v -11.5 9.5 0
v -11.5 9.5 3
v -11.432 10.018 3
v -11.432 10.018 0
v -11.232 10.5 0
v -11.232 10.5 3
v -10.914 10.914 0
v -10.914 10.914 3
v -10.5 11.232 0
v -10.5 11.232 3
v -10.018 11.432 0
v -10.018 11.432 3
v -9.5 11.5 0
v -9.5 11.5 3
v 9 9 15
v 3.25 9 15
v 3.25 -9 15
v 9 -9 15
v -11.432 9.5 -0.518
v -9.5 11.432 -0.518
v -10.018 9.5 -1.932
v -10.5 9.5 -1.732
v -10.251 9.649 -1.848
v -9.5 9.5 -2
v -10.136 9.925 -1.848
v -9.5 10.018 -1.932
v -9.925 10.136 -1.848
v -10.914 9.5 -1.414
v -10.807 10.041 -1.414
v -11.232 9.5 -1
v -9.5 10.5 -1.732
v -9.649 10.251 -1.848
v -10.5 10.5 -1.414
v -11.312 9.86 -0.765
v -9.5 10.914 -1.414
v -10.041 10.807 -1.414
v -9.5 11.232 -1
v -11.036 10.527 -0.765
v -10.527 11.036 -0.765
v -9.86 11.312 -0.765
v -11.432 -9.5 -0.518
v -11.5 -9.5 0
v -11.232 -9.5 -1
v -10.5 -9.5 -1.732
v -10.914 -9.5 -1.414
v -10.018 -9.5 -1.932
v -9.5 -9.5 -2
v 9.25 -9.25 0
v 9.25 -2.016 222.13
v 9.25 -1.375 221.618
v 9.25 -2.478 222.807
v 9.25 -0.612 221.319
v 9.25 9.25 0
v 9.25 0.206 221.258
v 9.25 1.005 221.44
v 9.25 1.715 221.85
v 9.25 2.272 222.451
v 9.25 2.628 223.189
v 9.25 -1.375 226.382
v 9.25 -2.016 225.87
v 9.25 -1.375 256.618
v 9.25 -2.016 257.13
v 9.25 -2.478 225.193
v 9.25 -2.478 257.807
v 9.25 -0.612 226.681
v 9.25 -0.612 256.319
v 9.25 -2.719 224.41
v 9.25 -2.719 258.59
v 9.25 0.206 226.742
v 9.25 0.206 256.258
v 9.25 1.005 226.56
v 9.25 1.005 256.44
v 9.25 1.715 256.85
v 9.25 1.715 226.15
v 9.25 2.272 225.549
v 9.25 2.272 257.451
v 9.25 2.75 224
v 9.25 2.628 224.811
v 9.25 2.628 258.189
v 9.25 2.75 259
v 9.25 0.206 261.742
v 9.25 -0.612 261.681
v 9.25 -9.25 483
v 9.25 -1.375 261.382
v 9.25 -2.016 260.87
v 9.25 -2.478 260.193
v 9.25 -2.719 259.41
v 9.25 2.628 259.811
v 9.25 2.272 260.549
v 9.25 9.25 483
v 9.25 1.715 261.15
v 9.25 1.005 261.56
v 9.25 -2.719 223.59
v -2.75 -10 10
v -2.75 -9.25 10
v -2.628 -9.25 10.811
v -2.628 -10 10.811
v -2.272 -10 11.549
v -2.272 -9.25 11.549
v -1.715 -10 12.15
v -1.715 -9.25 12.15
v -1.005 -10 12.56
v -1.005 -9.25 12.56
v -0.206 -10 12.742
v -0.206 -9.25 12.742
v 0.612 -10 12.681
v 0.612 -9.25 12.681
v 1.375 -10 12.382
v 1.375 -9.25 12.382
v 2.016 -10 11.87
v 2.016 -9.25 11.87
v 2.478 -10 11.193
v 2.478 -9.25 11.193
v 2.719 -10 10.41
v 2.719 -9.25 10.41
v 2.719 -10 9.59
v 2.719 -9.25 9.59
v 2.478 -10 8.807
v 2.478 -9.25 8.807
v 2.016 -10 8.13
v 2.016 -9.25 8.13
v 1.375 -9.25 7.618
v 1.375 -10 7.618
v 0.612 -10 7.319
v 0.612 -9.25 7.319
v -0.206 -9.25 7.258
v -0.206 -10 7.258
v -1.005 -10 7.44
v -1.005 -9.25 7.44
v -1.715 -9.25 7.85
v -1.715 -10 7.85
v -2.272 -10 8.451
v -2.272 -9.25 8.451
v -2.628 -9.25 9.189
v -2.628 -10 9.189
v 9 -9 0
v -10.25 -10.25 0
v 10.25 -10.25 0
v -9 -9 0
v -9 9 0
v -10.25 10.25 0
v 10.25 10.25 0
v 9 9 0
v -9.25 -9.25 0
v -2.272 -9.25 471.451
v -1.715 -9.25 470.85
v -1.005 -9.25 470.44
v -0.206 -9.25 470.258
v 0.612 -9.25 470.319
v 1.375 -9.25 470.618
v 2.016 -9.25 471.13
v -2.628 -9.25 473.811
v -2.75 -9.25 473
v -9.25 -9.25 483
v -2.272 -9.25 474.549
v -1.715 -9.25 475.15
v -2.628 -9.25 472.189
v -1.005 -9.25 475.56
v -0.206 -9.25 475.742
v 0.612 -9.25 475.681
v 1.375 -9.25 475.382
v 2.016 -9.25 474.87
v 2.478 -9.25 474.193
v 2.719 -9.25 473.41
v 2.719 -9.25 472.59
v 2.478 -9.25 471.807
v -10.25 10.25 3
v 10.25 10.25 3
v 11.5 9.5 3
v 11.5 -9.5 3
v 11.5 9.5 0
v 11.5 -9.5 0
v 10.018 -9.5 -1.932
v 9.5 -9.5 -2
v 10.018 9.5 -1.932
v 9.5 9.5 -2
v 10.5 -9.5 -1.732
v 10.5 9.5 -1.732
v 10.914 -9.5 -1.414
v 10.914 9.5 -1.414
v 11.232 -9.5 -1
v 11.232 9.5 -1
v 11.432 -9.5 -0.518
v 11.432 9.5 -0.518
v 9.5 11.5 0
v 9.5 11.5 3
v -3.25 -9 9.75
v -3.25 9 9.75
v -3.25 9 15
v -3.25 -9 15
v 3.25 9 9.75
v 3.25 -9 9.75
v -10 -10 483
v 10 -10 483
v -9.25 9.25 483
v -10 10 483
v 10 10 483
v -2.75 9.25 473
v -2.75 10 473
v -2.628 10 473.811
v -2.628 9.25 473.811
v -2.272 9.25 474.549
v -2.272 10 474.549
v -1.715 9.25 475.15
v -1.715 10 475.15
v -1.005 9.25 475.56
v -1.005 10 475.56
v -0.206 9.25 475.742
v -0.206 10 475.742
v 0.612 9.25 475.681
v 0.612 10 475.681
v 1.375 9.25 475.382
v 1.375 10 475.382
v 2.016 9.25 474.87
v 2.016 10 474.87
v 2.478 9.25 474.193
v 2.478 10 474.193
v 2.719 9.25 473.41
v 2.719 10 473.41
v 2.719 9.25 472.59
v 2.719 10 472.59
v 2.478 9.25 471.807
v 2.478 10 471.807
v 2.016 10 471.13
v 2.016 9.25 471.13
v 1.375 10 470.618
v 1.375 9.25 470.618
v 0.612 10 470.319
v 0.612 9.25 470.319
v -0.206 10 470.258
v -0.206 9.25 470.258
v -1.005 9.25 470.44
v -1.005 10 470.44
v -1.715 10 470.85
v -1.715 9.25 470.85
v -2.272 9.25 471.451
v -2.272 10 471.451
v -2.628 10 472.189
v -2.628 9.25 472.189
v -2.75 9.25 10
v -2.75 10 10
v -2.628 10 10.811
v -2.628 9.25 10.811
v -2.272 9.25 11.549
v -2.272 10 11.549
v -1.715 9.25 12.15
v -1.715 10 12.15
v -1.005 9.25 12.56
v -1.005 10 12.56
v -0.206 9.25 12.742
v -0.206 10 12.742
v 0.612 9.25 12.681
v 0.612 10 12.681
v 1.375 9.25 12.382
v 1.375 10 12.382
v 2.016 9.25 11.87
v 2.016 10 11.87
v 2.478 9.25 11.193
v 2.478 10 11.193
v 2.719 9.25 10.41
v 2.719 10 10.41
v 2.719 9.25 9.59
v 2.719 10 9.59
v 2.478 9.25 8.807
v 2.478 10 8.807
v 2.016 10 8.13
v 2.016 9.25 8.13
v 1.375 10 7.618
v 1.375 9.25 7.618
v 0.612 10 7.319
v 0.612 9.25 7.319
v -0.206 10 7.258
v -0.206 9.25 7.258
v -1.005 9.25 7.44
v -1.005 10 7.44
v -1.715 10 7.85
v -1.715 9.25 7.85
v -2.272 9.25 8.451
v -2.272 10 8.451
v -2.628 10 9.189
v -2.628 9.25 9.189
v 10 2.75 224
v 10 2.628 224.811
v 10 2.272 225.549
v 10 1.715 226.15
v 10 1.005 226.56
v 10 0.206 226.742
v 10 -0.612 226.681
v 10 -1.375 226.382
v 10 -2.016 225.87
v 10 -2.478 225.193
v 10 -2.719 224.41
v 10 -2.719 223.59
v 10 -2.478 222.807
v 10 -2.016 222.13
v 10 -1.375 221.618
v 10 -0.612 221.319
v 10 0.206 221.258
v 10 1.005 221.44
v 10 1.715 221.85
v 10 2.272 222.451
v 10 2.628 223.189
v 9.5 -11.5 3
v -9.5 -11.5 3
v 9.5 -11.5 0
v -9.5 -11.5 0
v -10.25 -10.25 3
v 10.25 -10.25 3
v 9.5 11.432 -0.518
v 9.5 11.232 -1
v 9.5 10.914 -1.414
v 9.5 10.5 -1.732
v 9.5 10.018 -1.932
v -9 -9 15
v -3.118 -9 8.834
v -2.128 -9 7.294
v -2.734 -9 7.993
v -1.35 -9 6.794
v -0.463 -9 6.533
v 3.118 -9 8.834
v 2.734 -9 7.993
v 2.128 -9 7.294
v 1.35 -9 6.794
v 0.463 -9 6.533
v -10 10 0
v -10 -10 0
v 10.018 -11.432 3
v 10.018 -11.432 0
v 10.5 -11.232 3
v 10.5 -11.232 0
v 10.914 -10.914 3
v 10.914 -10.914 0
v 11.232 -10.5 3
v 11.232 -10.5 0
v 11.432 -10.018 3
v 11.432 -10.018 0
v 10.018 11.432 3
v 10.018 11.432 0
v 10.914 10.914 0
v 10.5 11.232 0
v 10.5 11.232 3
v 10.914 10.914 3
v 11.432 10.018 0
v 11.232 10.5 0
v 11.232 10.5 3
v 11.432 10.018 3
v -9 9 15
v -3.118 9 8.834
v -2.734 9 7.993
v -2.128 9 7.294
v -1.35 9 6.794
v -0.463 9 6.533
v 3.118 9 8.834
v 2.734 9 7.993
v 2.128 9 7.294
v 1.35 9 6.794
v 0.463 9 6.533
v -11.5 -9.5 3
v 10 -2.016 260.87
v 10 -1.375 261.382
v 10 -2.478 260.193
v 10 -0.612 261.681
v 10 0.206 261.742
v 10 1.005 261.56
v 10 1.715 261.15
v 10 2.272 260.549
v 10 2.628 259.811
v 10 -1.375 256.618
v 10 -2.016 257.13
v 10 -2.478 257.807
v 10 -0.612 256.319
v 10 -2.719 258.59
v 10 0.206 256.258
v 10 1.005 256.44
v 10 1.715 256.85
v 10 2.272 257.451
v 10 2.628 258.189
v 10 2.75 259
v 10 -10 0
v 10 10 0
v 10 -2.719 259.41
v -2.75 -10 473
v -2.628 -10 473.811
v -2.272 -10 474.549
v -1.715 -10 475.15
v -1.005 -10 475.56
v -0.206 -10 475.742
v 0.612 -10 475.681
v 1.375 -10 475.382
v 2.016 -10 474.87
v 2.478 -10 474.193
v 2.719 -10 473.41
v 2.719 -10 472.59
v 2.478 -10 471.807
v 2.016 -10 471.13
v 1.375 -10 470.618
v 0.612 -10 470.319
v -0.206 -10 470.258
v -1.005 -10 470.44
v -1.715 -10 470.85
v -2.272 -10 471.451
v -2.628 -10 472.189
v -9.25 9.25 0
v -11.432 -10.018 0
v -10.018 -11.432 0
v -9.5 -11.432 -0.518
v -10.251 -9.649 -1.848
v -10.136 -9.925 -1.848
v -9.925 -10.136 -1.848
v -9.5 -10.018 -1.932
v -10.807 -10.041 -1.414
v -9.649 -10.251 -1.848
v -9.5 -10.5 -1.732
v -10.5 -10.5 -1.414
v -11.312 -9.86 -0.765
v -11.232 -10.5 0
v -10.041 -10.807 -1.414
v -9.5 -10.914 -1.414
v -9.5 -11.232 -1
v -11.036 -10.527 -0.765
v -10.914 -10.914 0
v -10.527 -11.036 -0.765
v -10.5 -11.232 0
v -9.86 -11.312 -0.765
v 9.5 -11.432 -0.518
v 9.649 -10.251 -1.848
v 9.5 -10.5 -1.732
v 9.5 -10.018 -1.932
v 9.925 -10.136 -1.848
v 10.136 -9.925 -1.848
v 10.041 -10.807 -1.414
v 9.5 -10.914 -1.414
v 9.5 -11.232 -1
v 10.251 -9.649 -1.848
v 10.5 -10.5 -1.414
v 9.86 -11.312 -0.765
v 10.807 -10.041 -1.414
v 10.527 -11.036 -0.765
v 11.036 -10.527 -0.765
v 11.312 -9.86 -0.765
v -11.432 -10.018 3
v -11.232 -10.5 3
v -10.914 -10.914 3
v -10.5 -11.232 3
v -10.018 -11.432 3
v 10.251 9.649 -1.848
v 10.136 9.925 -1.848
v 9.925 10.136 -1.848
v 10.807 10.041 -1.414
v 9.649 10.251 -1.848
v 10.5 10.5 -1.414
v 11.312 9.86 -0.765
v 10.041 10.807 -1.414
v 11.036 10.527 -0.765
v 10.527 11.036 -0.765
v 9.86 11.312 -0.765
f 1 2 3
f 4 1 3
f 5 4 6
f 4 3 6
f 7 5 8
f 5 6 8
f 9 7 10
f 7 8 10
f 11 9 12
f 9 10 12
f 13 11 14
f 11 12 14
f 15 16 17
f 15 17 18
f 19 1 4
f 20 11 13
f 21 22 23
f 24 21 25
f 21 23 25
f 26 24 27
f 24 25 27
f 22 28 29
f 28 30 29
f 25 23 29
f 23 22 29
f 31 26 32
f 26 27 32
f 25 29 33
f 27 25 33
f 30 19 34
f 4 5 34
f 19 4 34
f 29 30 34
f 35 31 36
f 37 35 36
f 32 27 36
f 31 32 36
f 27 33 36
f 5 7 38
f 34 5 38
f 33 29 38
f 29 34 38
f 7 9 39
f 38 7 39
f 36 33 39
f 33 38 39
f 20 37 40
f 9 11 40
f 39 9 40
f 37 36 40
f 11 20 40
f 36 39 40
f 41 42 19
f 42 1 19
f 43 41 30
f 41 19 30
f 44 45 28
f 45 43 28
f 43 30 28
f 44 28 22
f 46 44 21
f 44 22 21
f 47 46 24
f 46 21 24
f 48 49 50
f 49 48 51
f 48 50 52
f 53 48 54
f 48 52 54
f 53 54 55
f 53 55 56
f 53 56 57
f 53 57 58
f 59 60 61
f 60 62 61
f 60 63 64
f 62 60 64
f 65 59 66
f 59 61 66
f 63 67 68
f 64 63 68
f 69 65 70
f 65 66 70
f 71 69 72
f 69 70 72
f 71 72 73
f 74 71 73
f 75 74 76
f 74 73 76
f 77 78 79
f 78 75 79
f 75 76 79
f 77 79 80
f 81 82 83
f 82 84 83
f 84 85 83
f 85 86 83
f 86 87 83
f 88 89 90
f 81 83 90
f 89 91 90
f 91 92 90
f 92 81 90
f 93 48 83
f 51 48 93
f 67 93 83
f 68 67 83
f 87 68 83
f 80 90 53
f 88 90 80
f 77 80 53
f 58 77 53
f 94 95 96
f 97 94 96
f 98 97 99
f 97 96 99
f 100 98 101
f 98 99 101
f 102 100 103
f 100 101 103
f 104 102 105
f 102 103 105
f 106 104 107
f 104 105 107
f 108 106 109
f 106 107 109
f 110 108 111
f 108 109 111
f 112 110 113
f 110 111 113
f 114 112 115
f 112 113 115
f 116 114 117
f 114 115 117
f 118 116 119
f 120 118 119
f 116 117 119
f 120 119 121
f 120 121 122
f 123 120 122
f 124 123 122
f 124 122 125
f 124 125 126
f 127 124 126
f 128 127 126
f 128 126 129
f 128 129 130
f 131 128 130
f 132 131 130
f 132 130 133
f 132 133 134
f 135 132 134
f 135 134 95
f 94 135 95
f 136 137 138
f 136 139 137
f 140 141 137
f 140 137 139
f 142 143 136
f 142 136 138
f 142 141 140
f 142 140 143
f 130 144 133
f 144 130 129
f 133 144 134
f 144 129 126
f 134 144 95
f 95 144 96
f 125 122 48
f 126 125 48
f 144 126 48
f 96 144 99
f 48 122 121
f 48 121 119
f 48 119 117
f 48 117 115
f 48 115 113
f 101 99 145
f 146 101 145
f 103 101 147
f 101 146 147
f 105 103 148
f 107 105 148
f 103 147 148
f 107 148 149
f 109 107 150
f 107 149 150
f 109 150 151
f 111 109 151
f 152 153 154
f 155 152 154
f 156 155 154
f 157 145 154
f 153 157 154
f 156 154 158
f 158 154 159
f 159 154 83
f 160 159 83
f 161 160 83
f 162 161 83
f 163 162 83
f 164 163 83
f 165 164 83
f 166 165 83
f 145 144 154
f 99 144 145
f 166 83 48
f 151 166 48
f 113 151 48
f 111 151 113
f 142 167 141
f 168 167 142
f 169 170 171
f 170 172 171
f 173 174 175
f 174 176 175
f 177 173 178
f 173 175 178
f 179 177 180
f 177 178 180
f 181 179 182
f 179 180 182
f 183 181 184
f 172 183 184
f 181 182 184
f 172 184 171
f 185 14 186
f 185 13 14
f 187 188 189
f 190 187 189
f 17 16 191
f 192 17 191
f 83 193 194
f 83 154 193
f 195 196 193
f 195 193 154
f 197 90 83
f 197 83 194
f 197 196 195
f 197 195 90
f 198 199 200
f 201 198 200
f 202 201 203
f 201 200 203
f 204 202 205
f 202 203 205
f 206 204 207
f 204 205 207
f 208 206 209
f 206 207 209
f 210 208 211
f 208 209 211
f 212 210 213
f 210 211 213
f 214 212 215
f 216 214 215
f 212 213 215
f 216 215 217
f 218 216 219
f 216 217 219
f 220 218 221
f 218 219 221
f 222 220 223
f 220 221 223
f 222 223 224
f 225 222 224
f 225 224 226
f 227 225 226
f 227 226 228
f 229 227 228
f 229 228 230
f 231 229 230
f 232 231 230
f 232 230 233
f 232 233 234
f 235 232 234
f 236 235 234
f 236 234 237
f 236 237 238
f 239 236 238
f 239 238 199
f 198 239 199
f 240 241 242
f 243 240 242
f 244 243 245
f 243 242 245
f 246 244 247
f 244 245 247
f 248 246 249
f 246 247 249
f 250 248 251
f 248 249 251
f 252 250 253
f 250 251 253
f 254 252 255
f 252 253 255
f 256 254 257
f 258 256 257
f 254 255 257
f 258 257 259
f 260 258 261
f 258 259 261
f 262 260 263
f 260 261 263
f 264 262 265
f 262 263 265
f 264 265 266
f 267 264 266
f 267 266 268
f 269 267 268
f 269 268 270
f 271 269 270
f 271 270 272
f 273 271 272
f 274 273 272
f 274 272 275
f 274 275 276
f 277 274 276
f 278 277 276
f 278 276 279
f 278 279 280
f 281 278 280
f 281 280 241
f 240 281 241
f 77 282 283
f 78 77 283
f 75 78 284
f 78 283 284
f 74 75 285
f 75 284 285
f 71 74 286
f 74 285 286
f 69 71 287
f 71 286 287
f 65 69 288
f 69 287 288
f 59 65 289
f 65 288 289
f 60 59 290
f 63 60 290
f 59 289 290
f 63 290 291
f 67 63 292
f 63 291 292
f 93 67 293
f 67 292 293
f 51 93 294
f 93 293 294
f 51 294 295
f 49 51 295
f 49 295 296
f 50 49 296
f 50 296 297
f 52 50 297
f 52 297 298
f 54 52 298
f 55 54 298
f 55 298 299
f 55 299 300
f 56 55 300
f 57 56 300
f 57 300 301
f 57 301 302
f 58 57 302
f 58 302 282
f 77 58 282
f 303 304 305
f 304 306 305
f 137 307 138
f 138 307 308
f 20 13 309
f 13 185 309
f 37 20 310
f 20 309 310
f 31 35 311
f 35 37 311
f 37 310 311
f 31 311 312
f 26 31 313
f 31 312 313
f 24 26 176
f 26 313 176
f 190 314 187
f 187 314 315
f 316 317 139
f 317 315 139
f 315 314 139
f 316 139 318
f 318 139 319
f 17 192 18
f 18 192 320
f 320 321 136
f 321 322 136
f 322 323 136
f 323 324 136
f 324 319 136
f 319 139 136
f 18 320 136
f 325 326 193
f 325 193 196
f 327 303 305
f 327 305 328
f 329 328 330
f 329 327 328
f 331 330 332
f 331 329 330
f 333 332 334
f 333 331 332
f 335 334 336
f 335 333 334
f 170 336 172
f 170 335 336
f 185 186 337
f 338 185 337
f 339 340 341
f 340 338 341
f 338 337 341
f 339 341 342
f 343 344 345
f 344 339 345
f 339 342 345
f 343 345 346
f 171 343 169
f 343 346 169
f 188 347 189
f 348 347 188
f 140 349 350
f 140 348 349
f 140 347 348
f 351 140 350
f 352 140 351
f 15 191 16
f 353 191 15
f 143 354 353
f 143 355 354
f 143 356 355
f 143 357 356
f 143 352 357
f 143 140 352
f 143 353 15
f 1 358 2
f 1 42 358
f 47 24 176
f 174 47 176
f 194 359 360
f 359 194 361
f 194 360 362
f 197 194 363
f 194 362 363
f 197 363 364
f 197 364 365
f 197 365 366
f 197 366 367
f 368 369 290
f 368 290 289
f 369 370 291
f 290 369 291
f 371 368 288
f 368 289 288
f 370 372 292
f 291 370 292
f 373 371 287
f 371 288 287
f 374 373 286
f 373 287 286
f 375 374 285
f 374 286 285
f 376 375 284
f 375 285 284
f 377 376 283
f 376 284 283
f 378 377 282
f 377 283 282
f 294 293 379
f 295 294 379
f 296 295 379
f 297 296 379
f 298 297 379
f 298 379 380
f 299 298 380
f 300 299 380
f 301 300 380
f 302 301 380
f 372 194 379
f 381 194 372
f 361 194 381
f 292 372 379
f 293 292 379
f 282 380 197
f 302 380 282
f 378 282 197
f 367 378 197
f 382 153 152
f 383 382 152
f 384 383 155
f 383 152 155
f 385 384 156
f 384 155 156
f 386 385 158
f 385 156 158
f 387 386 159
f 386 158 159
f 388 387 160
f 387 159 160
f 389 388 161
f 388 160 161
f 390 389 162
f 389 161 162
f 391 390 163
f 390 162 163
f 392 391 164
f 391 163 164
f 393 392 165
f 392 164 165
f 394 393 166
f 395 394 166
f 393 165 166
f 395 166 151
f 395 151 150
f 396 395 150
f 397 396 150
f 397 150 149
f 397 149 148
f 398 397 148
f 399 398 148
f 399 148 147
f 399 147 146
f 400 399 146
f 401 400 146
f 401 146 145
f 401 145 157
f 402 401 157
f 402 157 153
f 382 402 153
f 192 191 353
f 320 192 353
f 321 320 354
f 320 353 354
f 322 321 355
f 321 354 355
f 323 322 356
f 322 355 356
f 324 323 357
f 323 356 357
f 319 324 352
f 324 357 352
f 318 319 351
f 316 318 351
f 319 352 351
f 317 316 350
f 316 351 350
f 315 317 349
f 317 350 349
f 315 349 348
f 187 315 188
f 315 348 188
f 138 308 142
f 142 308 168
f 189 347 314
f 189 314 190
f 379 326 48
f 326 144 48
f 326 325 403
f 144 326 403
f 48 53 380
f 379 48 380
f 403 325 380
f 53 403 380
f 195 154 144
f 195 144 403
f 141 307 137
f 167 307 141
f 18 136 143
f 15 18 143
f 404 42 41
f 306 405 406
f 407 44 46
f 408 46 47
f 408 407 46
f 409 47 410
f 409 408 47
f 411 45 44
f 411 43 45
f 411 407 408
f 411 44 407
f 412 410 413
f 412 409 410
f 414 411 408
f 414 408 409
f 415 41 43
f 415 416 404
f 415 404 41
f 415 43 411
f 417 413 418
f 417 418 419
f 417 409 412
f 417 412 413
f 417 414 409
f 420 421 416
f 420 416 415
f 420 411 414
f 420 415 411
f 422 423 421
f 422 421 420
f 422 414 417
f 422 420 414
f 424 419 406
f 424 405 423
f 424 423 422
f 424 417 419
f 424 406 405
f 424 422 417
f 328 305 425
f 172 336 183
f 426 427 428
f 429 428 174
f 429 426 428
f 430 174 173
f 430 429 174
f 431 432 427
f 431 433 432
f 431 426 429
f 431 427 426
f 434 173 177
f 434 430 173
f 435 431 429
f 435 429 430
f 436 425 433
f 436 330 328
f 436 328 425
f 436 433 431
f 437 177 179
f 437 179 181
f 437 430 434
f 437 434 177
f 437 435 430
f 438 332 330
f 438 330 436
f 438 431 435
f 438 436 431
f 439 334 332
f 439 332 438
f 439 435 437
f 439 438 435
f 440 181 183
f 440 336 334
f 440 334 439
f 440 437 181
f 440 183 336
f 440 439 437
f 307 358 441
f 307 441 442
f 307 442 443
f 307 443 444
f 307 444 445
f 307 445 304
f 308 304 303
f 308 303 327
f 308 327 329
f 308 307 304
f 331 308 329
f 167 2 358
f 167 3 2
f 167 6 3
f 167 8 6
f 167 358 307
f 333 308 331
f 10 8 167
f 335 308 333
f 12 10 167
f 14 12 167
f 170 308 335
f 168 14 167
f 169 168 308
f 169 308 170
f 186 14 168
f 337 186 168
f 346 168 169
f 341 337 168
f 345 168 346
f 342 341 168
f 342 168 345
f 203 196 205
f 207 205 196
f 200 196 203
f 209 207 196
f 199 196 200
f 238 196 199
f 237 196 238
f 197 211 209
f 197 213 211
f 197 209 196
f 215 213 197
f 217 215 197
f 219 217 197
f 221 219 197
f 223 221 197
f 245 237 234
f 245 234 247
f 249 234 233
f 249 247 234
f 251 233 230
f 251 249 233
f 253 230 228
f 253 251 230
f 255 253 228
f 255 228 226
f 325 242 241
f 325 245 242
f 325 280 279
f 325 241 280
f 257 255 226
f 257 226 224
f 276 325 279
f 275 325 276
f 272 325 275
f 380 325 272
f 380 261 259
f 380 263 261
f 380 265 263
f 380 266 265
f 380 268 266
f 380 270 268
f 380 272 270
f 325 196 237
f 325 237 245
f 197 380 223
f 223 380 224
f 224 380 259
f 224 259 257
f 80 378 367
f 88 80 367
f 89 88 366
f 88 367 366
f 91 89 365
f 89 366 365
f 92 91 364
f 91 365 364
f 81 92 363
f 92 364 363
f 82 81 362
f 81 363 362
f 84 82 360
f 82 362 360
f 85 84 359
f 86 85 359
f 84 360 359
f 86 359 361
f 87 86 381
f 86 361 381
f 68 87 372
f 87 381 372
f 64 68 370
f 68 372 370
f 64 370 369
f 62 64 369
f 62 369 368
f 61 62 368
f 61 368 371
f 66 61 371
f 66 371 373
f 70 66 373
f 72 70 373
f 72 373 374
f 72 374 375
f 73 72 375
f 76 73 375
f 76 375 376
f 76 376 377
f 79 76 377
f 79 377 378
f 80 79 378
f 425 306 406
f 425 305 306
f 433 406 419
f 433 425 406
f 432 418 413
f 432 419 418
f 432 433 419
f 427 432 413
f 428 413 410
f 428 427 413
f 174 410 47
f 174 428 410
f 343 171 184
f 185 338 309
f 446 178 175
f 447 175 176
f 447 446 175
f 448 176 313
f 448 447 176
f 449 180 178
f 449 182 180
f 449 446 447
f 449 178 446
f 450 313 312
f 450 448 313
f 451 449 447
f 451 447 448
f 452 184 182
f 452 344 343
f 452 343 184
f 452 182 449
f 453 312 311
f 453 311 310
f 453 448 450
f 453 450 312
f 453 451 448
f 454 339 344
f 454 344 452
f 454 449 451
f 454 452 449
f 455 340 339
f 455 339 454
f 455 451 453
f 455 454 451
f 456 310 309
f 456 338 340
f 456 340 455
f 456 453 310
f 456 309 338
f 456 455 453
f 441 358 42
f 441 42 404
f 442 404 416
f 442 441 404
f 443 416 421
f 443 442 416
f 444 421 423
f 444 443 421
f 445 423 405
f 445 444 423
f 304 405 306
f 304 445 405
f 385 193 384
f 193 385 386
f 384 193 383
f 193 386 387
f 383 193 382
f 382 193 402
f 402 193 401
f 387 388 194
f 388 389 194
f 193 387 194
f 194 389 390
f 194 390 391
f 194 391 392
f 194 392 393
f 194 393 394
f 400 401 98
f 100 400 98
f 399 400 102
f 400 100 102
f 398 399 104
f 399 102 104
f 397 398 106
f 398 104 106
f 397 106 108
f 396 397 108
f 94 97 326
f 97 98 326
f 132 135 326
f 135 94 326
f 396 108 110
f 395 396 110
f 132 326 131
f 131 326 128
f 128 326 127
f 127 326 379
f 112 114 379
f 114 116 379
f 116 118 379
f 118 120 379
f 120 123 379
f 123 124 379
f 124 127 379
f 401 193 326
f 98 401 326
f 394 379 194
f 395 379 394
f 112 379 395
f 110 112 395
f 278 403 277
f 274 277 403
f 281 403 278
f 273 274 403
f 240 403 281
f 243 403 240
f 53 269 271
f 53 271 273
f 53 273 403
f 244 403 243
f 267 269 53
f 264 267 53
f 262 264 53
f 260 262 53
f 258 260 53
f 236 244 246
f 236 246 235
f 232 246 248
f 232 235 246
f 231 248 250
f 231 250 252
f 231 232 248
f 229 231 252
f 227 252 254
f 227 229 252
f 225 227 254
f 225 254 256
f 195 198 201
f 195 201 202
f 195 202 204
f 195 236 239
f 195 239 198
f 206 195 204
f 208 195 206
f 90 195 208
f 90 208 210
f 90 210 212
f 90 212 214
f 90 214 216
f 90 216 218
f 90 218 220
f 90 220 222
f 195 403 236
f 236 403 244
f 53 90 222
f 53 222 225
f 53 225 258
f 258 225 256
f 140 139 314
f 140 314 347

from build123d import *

# Parameters (mm, degrees)
F0_W      = 20
F0_H      = 20
F1_DEPTH  = 483
F2_W      = 18.5
F2_H      = 18.5
F3_DEPTH  = 483.001
F4_R      = 2.75
F5_DEPTH  = 25
F7_W      = 23
F7_H      = 23
F8_DEPTH  = 5
F9_W      = 20.5
F9_H      = 20.5
F10_DEPTH = 3
F11_W     = 18
F11_H     = 18
F12_DEPTH = 15
F14_DEPTH = 20.501
F15_R     = 2
F16_R     = 2.75
F17_DEPTH = 5


with BuildPart() as f1:
    # F0 (on Top) → F1 (new body)
    with BuildSketch(Plane.XY):
        Rectangle(F0_W, F0_H)
    extrude(amount=F1_DEPTH)

    # F2 (on face) → F3 (cut, through all)
    with BuildSketch(Plane.XY.offset(483)):
        Rectangle(F2_W, F2_H)
    extrude(amount=-F3_DEPTH, mode=Mode.SUBTRACT)

    # F4 (on face) → F5 (cut)
    with BuildSketch(Plane(origin=(0, 10, 0), x_dir=(-1, 0, 0), z_dir=(0, 1, 0))):
        with Locations((0, 473)):
            Circle(F4_R)
        with Locations((0, 10)):
            Circle(F4_R)
    extrude(amount=-F5_DEPTH, mode=Mode.SUBTRACT)

    # F16 (on face) → F17 (cut)
    with BuildSketch(Plane.YZ.offset(10)):
        with Locations((0, 224)):
            Circle(F16_R)
        with Locations((0, 259)):
            Circle(F16_R)
    extrude(amount=-F17_DEPTH, mode=Mode.SUBTRACT)


with BuildPart() as f8:
    # F7 (on offset) → F8 (new body)
    with BuildSketch(Plane.XY.offset(-2)):
        Rectangle(F7_W, F7_H)
    extrude(amount=F8_DEPTH)

    # F9 (on face) → F10 (cut)
    with BuildSketch(Plane.XY.offset(3)):
        Rectangle(F9_W, F9_H)
    extrude(amount=-F10_DEPTH, mode=Mode.SUBTRACT)

    # F11 (on face) → F12 (join)
    with BuildSketch(Plane.XY):
        Rectangle(F11_W, F11_H)
    extrude(amount=F12_DEPTH)

    # F13 (on face) → F14 (cut, through all)
    with BuildSketch(Plane(origin=(0, 9, 0), x_dir=(-1, 0, 0), z_dir=(0, 1, 0))):
        with BuildLine():
            Line((3.25, 15), (-3.25, 15))
            Line((-3.25, 15), (-3.25, 9.75))
            ThreePointArc((-3.25, 9.75), (0, 6.5), (3.25, 9.75))
            Line((3.25, 9.75), (3.25, 15))
        make_face()
    extrude(amount=-F14_DEPTH, mode=Mode.SUBTRACT)

    # F15
    f15_edges = [f8.edges().sort_by_distance(p)[0] for p in [
        (11.5, -11.5, 0.5),
        (-11.5, -11.5, 0.5),
        (11.5, 11.5, 0.5),
        (-11.5, 11.5, 0.5),
        (-11.5, 0, -2),
        (0, -11.5, -2),
        (11.5, 0, -2),
        (0, 11.5, -2),
    ]]
    fillet(f15_edges, radius=F15_R)


solid = Compound([f1.part, f8.part])
